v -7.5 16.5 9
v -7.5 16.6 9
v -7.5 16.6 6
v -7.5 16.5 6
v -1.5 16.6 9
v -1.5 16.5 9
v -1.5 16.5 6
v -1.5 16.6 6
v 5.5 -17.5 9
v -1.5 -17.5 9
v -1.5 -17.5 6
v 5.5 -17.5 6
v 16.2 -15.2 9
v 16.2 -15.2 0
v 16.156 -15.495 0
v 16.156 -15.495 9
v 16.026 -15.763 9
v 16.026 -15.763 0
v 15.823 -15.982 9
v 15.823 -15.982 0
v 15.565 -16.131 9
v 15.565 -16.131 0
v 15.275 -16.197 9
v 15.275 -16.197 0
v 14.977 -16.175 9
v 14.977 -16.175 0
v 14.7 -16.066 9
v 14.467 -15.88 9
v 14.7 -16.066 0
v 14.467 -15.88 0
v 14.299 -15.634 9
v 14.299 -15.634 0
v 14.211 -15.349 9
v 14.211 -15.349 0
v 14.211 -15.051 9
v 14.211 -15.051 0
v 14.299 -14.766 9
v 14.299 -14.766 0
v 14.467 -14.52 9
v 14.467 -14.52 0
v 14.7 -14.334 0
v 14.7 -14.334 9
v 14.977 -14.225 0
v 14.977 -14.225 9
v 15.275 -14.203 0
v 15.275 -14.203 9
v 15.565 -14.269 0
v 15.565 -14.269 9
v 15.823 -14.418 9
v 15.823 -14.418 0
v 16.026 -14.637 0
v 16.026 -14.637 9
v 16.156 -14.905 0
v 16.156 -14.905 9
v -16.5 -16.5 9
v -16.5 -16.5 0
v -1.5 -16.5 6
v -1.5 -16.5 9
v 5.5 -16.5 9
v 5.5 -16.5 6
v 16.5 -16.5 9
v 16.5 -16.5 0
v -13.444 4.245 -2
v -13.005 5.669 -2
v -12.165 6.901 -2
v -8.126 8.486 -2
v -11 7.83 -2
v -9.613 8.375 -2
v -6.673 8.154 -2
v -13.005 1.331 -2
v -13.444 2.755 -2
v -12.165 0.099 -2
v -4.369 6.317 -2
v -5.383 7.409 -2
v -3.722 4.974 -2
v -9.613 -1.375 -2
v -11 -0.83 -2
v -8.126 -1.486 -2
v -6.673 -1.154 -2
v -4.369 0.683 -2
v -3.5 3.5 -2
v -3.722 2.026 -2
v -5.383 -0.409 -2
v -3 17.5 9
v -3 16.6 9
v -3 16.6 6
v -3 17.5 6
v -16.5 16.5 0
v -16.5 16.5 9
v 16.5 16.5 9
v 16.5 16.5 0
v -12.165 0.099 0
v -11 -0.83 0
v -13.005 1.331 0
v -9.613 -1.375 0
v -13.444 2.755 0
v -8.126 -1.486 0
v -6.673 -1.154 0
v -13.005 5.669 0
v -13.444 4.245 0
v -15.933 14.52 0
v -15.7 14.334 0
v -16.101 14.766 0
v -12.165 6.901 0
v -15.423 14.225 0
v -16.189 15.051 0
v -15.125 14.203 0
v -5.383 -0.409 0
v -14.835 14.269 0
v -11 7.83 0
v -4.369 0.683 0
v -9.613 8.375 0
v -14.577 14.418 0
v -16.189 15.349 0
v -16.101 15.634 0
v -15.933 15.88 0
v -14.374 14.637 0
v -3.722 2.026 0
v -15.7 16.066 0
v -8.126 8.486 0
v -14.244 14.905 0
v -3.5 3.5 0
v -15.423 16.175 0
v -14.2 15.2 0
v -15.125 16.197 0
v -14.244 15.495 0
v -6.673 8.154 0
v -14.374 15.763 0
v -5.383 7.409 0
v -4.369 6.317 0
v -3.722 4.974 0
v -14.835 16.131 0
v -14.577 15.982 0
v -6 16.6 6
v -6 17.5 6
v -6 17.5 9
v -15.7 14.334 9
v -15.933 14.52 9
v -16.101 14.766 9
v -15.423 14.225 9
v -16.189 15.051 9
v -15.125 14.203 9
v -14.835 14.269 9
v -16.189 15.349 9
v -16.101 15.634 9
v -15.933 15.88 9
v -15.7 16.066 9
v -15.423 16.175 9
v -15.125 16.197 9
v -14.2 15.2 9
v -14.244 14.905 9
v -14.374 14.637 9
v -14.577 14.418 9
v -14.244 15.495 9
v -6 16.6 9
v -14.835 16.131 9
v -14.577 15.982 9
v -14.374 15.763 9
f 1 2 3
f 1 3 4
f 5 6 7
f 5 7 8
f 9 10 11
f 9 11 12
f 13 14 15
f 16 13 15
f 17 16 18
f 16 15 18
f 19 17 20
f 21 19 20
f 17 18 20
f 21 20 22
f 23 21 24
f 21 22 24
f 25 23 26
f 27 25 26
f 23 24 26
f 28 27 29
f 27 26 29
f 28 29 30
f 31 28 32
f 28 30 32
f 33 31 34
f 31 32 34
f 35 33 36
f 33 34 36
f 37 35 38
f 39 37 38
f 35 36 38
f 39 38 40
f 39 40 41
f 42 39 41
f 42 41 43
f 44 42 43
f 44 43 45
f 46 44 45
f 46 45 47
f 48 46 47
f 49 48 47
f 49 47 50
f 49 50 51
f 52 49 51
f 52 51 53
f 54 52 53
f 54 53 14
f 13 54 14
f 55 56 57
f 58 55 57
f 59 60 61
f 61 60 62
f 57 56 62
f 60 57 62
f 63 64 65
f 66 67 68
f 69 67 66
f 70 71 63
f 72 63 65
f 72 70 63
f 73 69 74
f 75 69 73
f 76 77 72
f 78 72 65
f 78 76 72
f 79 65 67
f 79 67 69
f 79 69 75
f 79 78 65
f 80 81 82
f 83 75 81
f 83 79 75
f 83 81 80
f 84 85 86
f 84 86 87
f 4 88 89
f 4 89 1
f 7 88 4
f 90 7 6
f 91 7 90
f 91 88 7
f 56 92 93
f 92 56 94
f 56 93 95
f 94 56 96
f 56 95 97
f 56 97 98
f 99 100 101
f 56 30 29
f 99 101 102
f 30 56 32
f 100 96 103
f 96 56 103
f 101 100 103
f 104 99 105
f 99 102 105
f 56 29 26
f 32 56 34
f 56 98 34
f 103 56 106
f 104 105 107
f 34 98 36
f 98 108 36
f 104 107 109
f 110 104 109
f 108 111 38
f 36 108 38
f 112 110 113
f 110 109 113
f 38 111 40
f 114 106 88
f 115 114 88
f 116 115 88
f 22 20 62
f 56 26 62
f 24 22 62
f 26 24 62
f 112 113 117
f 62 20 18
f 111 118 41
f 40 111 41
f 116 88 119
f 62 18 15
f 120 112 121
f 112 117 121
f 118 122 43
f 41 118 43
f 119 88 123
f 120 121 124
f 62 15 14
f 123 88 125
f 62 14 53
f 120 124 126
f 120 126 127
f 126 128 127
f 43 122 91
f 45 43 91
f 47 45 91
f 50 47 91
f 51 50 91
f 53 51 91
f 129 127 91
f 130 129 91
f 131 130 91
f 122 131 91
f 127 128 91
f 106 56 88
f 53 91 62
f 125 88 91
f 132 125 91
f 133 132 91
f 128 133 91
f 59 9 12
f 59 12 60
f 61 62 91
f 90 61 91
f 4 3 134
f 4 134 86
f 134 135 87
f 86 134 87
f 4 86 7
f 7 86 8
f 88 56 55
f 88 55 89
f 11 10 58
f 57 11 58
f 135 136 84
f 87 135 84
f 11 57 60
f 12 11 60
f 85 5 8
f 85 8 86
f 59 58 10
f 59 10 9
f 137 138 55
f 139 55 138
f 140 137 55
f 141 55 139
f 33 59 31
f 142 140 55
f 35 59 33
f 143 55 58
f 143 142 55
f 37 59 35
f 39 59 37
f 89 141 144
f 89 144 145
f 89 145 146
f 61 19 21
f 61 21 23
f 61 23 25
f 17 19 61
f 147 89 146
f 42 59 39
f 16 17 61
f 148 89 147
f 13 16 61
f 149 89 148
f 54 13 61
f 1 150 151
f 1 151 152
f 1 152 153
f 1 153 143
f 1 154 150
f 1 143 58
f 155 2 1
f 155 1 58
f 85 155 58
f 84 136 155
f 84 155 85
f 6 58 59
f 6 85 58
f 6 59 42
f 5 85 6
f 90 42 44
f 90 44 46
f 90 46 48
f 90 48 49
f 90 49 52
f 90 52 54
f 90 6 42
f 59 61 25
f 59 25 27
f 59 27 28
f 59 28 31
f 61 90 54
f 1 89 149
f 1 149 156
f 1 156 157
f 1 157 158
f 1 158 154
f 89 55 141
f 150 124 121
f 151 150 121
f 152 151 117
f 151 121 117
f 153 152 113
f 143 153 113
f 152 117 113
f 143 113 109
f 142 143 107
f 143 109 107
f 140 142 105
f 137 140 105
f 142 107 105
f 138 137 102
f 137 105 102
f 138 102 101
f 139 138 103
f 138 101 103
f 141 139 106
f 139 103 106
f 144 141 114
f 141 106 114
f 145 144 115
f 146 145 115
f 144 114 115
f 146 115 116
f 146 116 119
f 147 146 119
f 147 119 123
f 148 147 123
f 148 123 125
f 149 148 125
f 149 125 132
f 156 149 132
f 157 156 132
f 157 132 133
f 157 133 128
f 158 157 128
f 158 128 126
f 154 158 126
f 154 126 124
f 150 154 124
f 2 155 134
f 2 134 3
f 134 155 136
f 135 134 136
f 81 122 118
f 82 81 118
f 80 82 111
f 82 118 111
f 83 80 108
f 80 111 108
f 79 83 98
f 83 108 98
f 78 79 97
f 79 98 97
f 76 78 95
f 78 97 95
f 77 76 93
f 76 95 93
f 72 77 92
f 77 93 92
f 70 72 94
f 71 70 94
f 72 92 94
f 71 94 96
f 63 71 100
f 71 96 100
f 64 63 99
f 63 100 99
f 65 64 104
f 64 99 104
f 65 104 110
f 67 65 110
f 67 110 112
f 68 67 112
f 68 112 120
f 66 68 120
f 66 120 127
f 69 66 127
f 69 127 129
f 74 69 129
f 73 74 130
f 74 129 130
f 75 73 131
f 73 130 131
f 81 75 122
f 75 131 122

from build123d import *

# Parameters (mm, degrees)
F0_W     = 33
F0_H     = 33
F1_DEPTH = 9
F2_W     = 3
F2_H     = 0.9
F2_W_2   = 7
F2_H_2   = 7.583788
F3_DEPTH = 3
F4_R     = 5
F5_DEPTH = 2
F6_R     = 1
F7_DEPTH = 25


with BuildPart() as f1:
    # F0 (on Top) → F1 (new body)
    with BuildSketch(Plane.XY):
        Rectangle(F0_W, F0_H)
    extrude(amount=F1_DEPTH)

    # F2 (on face) → F3 (join)
    with BuildSketch(Plane.XY.offset(9)):
        Polygon((-7.5, 16.6), (-7.5, 16.5), (-1.5, 16.5), (-1.5, 16.6), (-3, 16.6), (-6, 16.6), align=None)
        with Locations((-4.5, 17.05)):
            Rectangle(F2_W, F2_H)
        with Locations((2, -13.708106)):
            Rectangle(F2_W_2, F2_H_2)
    extrude(amount=-F3_DEPTH)

    # F4 (on face) → F5 (join)
    with BuildSketch(Plane(origin=(0, 0, 0), x_dir=(1, 0, 0), z_dir=(0, 0, -1))):
        with Locations((-8.5, -3.5)):
            Circle(F4_R)
    extrude(amount=F5_DEPTH)

    # F6 (on face) → F7 (cut)
    with BuildSketch(Plane(origin=(0, 0, 0), x_dir=(1, 0, 0), z_dir=(0, 0, -1))):
        with Locations((-15.2, -15.2)):
            Circle(F6_R)
        with Locations((15.2, 15.2)):
            Circle(F6_R)
    extrude(amount=-F7_DEPTH, mode=Mode.SUBTRACT)


solid = f1.part
